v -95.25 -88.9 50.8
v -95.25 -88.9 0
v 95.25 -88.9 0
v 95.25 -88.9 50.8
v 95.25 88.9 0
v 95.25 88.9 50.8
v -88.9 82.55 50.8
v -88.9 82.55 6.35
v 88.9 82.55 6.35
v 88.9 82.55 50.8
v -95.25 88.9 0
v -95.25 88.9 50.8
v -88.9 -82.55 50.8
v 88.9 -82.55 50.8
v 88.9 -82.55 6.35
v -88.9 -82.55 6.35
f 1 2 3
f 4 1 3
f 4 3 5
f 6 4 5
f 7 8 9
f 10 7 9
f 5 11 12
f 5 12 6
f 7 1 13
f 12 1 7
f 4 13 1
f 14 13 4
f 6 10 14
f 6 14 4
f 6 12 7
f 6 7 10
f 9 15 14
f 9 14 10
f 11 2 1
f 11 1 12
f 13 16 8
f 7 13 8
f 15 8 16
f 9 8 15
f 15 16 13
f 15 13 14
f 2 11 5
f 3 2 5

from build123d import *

# Parameters (mm, degrees)
F0_W     = 177.8
F0_H     = 165.1
F1_DEPTH = 6.35
F2_W     = 190.5
F2_H     = 177.8
F2_W_2   = 177.8
F2_H_2   = 165.1
F3_DEPTH = 50.8


with BuildPart() as f1:
    # F0 (on Top) → F1 (new body)
    with BuildSketch(Plane.XY):
        Rectangle(F0_W, F0_H)
    extrude(amount=F1_DEPTH)

    # F2 (on Top) → F3 (join)
    with BuildSketch(Plane.XY):
        Rectangle(F2_W, F2_H)
        Rectangle(F2_W_2, F2_H_2, mode=Mode.SUBTRACT)
    extrude(amount=F3_DEPTH)


solid = f1.part
